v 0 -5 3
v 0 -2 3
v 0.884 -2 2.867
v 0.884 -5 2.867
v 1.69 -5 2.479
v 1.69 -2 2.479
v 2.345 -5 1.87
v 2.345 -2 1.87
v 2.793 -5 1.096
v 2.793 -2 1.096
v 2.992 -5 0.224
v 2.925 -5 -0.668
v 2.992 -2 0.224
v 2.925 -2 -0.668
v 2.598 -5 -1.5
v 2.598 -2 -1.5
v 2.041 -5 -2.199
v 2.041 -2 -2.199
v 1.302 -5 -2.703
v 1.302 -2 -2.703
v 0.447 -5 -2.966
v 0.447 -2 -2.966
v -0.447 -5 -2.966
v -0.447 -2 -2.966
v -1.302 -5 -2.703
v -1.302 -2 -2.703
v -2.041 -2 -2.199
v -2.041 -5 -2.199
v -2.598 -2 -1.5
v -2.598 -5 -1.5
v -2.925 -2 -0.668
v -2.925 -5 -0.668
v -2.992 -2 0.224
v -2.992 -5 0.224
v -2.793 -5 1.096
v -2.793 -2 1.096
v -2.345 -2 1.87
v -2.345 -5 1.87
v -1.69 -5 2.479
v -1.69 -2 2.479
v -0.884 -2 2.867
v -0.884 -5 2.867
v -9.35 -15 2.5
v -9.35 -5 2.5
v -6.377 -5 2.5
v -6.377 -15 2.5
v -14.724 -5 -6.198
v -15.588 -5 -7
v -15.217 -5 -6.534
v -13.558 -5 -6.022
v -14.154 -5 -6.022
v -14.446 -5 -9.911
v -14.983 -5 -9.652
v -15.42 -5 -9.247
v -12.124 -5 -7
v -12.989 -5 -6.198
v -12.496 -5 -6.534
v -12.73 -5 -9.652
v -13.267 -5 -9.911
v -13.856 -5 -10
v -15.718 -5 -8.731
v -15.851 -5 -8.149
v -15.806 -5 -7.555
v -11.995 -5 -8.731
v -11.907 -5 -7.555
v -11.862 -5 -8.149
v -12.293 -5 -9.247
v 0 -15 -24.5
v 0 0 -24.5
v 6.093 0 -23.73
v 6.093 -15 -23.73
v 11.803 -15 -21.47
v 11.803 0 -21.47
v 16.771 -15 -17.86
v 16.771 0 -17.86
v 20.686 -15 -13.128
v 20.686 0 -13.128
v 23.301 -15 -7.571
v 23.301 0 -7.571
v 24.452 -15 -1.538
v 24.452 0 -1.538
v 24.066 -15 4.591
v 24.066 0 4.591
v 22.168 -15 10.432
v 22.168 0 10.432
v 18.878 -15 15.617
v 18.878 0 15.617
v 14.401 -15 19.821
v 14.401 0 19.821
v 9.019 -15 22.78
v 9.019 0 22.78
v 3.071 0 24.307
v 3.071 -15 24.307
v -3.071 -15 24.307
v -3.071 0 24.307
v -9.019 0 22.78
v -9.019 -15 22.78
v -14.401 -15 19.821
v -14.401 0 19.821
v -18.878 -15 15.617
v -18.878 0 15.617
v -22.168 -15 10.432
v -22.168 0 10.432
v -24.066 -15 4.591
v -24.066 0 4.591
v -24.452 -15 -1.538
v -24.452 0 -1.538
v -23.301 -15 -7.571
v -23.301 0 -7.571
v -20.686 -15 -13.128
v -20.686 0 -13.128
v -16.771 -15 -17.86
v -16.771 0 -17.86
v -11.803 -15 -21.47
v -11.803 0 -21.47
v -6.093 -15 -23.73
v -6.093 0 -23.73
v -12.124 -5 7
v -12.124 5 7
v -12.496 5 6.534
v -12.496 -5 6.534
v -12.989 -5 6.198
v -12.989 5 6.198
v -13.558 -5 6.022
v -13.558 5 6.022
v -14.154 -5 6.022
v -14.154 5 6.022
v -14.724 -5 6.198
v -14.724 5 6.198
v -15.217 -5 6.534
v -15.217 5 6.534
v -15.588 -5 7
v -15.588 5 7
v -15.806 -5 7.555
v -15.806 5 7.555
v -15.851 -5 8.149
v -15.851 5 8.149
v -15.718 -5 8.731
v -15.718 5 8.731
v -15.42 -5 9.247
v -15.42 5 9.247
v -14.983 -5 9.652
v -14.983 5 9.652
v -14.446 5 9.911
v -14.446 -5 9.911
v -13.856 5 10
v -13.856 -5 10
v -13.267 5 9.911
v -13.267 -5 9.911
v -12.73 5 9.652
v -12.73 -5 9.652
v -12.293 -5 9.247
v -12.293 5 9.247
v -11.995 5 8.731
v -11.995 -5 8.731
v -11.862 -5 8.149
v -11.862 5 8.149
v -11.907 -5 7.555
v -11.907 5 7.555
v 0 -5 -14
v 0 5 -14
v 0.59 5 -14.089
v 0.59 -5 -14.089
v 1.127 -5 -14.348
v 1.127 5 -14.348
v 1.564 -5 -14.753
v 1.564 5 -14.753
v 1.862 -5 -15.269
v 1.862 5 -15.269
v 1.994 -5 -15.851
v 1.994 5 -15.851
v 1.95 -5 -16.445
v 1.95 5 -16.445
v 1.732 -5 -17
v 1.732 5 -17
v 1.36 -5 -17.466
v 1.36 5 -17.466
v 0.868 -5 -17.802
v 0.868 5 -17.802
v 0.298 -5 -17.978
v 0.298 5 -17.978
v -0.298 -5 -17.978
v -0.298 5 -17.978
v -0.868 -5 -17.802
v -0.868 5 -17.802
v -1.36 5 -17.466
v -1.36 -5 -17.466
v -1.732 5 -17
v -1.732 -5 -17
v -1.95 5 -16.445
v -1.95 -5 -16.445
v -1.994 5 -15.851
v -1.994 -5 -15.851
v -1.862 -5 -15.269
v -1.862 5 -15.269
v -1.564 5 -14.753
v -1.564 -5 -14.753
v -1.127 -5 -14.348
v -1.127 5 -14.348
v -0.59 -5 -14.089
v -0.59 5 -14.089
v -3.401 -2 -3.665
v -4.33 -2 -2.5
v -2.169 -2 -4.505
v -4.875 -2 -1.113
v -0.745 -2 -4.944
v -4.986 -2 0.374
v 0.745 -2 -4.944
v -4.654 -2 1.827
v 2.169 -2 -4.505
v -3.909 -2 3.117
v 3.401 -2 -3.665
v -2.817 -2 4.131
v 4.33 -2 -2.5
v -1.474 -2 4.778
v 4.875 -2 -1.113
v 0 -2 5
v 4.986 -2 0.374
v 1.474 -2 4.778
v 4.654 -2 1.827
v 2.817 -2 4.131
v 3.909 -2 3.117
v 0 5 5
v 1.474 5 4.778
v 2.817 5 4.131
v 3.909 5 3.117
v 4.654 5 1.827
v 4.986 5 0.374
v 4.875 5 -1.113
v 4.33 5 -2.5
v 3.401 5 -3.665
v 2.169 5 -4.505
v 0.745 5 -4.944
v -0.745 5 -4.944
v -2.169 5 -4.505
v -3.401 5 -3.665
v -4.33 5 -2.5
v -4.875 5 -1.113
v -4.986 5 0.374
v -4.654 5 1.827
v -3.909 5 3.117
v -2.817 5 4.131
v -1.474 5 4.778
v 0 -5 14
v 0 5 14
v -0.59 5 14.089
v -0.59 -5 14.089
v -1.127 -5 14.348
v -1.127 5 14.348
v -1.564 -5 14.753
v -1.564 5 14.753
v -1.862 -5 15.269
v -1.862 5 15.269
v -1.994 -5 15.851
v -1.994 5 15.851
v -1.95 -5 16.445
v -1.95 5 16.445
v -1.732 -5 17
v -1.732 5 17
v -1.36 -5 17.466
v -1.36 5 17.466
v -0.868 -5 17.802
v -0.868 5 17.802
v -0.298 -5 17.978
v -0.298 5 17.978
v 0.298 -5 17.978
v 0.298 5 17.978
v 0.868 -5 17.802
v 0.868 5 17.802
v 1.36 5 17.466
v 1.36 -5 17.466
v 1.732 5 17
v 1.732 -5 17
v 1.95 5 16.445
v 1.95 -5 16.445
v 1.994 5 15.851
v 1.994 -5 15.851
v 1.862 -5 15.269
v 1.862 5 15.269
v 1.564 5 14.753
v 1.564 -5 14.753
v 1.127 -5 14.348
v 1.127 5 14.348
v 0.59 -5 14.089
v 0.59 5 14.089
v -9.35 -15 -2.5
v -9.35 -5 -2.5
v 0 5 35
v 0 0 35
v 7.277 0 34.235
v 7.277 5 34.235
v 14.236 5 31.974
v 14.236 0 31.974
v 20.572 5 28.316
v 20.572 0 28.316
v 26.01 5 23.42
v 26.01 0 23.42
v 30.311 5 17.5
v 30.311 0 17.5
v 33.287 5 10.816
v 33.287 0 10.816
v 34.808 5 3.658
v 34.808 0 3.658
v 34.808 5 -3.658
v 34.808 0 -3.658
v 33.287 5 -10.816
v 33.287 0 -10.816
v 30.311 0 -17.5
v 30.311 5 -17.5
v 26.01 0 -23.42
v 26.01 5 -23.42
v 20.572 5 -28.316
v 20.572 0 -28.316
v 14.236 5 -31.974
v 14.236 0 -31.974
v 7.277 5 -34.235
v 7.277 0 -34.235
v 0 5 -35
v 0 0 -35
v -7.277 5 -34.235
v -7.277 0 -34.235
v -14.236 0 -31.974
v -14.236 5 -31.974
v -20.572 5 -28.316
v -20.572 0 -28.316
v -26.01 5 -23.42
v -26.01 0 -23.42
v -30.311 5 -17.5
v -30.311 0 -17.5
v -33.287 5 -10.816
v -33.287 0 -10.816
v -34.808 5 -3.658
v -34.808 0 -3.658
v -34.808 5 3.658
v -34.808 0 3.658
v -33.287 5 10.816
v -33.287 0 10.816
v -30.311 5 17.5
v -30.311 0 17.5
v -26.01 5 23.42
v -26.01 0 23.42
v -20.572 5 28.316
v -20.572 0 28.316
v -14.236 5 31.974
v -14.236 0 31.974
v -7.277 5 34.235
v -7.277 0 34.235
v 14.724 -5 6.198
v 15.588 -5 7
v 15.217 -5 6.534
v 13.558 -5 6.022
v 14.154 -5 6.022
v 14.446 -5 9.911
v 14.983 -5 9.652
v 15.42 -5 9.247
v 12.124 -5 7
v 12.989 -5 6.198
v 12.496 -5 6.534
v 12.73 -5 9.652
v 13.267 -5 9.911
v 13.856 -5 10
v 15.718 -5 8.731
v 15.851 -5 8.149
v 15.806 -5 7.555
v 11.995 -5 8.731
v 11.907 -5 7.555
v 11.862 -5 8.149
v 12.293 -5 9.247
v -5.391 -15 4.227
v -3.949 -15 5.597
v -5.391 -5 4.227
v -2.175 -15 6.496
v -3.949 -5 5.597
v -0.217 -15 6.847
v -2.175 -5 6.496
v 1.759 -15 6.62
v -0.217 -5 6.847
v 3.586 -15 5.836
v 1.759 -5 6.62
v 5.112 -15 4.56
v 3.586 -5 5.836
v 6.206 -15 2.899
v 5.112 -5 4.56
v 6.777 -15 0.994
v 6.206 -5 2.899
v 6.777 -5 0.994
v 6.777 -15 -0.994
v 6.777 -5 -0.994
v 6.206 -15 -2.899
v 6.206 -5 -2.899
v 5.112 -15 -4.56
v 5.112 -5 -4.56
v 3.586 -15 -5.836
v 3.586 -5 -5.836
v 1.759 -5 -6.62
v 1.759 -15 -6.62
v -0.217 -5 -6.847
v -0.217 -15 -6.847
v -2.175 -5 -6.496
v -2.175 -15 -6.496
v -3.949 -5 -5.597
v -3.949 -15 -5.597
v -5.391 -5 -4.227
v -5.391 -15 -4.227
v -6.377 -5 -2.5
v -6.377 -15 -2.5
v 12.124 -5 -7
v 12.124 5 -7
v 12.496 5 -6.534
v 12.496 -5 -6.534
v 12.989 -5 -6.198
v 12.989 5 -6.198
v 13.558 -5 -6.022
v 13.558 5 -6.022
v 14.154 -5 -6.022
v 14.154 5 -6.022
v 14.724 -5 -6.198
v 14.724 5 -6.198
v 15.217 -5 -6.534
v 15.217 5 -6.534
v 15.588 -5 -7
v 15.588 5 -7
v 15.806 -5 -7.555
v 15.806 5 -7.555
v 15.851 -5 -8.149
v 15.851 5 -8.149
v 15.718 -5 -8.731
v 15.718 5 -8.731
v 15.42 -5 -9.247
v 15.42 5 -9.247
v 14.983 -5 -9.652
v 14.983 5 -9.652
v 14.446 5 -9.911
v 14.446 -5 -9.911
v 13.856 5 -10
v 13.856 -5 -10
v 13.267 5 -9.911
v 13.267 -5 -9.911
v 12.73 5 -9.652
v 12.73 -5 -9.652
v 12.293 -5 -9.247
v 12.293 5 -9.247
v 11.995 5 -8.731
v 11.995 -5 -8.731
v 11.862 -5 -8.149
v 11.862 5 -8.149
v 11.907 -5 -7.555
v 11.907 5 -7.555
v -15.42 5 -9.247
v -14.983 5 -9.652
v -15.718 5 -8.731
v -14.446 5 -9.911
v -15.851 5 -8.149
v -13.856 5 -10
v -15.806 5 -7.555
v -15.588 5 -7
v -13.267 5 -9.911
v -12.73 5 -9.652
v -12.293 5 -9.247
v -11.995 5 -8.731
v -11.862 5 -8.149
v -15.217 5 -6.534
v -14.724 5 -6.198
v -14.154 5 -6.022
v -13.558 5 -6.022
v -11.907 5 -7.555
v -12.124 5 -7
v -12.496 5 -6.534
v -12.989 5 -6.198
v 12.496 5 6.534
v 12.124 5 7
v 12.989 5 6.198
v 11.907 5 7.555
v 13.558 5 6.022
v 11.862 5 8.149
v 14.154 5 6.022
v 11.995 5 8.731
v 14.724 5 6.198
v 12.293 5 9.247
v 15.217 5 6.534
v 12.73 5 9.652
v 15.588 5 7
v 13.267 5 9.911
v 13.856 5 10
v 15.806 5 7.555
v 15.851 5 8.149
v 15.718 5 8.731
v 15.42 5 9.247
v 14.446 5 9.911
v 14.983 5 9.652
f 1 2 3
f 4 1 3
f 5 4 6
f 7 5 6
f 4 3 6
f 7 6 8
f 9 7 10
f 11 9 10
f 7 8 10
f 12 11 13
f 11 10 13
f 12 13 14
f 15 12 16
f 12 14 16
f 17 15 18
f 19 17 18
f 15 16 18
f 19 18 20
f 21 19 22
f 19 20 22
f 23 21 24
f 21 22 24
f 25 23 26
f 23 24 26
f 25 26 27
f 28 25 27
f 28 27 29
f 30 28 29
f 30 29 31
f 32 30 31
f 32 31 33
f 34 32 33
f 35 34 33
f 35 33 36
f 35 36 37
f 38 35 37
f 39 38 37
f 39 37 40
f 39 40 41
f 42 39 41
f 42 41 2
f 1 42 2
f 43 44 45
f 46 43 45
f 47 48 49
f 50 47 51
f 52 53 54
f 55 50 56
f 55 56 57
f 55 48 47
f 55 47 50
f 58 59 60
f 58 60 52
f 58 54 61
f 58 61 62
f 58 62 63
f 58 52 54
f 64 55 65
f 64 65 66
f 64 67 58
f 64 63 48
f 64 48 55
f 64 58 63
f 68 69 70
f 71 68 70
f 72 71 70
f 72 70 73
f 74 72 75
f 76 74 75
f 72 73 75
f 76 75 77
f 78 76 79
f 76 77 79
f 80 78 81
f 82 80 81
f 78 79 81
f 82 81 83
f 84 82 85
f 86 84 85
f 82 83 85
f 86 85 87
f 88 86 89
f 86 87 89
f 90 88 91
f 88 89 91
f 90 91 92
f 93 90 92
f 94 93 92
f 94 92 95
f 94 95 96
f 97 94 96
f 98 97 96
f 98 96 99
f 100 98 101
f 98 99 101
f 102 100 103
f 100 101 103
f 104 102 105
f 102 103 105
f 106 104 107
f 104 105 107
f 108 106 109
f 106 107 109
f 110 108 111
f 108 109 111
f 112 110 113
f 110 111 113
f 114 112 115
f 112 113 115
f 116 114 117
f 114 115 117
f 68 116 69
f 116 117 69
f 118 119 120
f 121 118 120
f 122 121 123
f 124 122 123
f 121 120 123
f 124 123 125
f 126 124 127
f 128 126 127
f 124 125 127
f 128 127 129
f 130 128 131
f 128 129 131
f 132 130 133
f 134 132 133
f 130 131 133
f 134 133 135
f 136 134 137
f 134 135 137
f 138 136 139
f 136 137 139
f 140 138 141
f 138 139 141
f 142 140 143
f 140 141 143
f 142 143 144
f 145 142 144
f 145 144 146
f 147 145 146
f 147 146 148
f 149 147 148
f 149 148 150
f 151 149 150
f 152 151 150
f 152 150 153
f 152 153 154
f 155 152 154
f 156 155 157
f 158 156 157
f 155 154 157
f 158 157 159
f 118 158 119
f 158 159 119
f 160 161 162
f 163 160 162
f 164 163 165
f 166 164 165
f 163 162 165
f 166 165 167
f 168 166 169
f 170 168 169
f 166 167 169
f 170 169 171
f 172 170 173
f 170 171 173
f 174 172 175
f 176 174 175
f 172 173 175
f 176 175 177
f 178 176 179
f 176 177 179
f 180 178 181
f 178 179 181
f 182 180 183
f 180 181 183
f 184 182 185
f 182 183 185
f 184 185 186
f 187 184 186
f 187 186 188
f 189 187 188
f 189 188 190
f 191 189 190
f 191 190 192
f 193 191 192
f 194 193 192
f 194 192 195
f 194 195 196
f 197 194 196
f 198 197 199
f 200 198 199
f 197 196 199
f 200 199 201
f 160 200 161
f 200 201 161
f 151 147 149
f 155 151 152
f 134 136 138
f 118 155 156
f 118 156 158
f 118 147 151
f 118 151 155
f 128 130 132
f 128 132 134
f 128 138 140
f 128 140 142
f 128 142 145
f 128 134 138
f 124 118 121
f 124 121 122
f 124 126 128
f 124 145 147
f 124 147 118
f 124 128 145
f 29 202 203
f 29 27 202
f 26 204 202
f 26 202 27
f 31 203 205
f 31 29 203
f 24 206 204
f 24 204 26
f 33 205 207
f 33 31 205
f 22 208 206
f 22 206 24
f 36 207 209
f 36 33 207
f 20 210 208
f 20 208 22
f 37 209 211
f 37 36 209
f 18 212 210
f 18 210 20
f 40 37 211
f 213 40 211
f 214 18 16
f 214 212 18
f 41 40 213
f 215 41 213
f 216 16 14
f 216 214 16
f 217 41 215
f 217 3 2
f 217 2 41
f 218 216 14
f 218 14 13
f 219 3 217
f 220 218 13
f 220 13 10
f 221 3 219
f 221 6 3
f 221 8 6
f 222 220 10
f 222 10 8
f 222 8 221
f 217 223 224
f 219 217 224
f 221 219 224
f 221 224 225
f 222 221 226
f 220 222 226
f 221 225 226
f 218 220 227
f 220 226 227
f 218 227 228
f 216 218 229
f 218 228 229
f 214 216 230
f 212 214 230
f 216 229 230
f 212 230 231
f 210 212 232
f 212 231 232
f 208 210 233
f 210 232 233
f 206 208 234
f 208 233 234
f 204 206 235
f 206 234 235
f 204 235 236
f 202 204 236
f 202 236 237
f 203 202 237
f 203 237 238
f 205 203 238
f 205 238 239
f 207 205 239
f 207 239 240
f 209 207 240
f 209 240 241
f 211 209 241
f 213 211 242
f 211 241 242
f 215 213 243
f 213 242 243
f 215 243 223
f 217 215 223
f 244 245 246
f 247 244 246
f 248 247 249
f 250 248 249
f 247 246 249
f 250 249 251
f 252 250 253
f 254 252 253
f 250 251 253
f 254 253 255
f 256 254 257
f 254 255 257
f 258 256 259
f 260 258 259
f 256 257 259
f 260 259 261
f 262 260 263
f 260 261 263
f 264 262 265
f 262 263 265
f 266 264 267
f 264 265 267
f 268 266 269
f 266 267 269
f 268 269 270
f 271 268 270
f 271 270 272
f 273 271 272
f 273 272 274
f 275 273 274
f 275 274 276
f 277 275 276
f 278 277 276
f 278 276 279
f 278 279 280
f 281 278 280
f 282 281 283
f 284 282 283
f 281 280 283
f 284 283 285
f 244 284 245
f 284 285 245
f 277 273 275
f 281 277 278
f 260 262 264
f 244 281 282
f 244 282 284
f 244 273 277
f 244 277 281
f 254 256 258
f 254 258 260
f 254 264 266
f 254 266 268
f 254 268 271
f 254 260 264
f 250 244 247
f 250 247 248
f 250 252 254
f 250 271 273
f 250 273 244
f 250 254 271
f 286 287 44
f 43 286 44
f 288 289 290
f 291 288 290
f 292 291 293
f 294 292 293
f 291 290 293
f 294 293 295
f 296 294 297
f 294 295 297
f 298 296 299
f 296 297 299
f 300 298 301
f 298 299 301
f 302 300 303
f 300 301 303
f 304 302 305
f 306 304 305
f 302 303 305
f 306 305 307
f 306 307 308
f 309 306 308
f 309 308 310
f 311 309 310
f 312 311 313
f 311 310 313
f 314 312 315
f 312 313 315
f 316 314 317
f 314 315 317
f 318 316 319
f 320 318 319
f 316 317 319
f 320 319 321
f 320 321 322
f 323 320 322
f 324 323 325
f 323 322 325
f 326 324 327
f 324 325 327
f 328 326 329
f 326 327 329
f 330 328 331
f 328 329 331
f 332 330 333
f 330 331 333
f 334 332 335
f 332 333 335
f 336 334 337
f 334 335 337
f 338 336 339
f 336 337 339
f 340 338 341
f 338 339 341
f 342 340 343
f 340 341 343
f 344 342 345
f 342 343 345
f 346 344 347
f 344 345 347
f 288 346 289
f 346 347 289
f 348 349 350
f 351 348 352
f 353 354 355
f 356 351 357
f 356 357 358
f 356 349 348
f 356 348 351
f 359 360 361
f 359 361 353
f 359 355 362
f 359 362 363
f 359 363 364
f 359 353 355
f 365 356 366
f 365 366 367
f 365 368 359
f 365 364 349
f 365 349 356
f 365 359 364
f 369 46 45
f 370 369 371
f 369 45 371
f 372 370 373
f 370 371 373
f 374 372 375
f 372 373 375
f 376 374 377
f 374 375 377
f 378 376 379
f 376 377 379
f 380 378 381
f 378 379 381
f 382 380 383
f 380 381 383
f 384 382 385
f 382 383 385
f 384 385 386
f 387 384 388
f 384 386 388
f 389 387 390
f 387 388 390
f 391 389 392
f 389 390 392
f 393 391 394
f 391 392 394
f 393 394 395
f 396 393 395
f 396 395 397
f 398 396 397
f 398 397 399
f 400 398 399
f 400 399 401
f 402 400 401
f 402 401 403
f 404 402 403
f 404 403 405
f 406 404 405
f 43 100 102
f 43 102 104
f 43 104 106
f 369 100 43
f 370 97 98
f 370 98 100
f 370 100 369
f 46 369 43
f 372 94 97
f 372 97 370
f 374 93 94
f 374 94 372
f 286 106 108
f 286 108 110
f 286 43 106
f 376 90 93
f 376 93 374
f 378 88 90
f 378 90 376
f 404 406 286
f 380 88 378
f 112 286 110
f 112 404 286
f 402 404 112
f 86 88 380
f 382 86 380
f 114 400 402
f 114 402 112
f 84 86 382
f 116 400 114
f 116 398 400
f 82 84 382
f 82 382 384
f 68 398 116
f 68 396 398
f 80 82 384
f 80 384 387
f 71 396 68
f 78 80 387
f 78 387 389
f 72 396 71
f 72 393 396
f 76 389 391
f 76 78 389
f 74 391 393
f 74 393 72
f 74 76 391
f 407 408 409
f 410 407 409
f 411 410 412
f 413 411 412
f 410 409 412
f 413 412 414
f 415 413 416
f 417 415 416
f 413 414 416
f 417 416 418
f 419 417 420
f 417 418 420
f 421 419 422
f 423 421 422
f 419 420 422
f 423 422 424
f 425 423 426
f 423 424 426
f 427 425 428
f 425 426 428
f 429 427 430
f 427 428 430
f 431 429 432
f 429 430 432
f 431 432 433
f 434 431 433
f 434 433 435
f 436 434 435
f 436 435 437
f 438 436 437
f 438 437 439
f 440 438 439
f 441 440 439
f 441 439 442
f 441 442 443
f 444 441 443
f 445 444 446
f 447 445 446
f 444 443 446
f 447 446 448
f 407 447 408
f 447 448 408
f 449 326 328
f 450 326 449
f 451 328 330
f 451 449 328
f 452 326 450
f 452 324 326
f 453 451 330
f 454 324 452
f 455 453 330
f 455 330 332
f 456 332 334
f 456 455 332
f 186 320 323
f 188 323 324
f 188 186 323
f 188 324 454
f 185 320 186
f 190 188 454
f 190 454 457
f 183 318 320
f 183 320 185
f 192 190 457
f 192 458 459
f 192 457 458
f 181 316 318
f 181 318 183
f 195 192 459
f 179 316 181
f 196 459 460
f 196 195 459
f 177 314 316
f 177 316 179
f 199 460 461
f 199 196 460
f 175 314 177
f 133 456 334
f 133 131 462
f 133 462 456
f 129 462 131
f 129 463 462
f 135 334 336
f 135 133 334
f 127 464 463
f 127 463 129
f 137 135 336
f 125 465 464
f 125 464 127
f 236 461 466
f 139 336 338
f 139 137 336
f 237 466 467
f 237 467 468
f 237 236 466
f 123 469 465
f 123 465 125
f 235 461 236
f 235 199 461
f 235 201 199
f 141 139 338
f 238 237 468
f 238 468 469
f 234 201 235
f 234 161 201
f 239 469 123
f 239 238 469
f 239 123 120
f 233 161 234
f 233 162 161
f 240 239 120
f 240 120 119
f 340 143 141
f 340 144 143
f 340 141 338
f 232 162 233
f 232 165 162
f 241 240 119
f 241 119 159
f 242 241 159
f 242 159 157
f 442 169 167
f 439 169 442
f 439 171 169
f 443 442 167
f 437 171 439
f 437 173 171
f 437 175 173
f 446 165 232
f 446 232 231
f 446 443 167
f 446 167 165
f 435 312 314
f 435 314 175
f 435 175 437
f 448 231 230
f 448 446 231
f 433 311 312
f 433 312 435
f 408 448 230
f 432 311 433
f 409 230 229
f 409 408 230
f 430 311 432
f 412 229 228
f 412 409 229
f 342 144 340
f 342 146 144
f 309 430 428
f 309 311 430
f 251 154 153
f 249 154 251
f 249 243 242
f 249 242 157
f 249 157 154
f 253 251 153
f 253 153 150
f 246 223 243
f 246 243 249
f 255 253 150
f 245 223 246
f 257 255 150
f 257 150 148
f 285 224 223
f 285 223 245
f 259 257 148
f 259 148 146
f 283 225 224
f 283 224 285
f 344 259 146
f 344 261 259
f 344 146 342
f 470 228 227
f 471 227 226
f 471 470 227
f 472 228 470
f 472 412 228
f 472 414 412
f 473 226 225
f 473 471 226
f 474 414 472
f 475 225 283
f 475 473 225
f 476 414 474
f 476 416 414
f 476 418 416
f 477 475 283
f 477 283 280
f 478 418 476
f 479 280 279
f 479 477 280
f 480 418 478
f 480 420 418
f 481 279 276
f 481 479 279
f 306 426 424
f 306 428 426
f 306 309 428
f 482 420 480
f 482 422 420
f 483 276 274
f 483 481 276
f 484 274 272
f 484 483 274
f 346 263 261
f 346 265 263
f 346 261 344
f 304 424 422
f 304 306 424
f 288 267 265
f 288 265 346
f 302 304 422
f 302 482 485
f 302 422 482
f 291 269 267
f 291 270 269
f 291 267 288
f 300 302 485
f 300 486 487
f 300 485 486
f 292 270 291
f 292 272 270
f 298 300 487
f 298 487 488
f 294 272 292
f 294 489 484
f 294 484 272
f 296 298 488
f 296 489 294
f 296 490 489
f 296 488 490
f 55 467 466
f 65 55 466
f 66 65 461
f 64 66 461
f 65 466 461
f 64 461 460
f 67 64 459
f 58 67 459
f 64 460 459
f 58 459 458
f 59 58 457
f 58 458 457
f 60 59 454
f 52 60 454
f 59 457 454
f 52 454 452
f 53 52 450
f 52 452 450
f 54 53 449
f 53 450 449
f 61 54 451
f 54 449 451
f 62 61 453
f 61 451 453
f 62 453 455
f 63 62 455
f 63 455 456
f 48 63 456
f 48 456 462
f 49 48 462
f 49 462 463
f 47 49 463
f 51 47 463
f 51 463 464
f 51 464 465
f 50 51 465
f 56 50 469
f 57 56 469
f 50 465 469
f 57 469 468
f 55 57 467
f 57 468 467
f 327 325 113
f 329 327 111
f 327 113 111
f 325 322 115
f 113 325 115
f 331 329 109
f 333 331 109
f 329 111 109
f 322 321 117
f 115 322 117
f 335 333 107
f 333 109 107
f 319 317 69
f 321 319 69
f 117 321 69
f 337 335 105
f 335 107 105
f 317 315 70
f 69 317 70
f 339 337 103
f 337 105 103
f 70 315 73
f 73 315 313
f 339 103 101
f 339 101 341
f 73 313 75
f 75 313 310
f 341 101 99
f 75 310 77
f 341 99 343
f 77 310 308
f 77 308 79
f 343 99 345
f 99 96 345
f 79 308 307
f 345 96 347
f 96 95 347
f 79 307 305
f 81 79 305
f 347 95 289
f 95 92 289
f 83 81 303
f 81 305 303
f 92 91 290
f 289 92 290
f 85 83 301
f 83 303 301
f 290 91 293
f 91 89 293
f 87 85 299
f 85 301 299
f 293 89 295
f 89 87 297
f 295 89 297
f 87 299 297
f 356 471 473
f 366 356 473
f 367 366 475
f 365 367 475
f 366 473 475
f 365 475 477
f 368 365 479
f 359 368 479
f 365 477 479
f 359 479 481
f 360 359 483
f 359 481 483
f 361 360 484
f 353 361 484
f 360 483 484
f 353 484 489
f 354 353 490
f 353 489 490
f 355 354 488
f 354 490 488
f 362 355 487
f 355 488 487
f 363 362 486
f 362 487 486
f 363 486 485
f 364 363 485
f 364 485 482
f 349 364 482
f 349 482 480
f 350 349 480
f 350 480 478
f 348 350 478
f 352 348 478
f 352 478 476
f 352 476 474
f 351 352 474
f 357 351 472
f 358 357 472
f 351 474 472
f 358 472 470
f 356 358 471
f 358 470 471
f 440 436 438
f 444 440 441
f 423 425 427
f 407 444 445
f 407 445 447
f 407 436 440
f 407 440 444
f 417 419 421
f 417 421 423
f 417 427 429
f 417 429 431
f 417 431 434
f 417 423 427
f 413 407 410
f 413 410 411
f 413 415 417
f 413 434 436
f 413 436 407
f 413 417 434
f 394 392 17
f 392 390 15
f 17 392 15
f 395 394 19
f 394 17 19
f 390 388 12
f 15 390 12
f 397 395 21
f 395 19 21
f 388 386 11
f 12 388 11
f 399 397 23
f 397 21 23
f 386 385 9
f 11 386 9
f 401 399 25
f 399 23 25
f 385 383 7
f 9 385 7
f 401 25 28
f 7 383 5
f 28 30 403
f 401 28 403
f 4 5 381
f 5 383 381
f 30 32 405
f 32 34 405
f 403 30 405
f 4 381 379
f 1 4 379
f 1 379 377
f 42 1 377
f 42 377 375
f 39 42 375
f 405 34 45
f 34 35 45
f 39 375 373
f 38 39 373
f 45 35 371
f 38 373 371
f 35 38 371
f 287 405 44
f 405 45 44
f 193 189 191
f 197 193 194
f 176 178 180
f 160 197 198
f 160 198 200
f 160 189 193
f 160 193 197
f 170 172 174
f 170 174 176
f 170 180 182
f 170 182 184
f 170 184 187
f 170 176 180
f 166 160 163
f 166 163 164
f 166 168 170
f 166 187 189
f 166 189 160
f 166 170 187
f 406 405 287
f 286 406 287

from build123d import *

# Parameters (mm, degrees)
CROQUIS1_R              = 35
SALIENTE_EXTRUIR1_DEPTH = 5
CROQUIS2_R              = 24.5
SALIENTE_EXTRUIR2_DEPTH = 15
CROQUIS3_R              = 6.85
SALIENTE_EXTRUIR3_DEPTH = 30
CROQUIS4_R              = 2
CORTAR_EXTRUIR1_DEPTH   = 10
MATRIZC1_COUNT          = 6
CORTAR_EXTRUIR2_START   = -30
CORTAR_EXTRUIR2_DEPTH   = 30
CUT_EXTRUDE1_START      = -40
CUT_EXTRUDE1_DEPTH      = 40
SKETCH2_R               = 5
CUT_EXTRUDE2_DEPTH      = 7
SKETCH3_R               = 3
CUT_EXTRUDE3_DEPTH      = 52.176166328


with BuildPart() as part:
    # Croquis1 → Saliente-Extruir1 (new body)
    with BuildSketch(Plane(origin=(0, 0, 0), x_dir=(1, 0, 0), z_dir=(0, 1, 0))):
        with Locations(Location((0, 0, 0), (0, 0, 270))):
            Circle(CROQUIS1_R)
    extrude(amount=SALIENTE_EXTRUIR1_DEPTH)

    # Croquis2 → Saliente-Extruir2 (add)
    with BuildSketch(Plane.XZ):
        with Locations(Location((0, 0, 0), (0, 0, 270))):
            Circle(CROQUIS2_R)
    extrude(amount=SALIENTE_EXTRUIR2_DEPTH)

    # Croquis3 → Saliente-Extruir3 (add)
    with BuildSketch(Plane.XZ.offset(15)):
        with Locations(Location((0, 0, 0), (0, 0, 270))):
            Circle(CROQUIS3_R)
    extrude(amount=SALIENTE_EXTRUIR3_DEPTH)

    # Croquis4 → Cortar-Extruir1 (cut)
    with BuildSketch(Plane(origin=(0, 5, 0), x_dir=(1, 0, 0), z_dir=(0, 1, 0))):
        with Locations(Location((0, 16, 0), (0, 0, 270))):
            Circle(CROQUIS4_R)
    cortar_extruir1 = extrude(amount=-CORTAR_EXTRUIR1_DEPTH, mode=Mode.SUBTRACT)

    # MatrizC1: Cortar-Extruir1 ×6 about axis
    matrizc1_axis = Axis((0, 0, 0), (0, 1, 0))
    for i in range(1, MATRIZC1_COUNT):
        add(cortar_extruir1.rotate(matrizc1_axis, i * 360 / MATRIZC1_COUNT), mode=Mode.SUBTRACT)

    # Croquis7 → Cortar-Extruir2 (cut)
    with BuildSketch(Plane.XZ.offset(45).offset(CORTAR_EXTRUIR2_START)):
        with BuildLine():
            Line((-6.37749951, 2.5), (-3.47749951, 2.5))
            Line((-3.47749951, 2.5), (-3.47749951, -2.5))
            Line((-3.47749951, -2.5), (-6.37749951, -2.5))
            ThreePointArc((-6.37749951, -2.5), (-6.85, 0), (-6.37749951, 2.5))
        make_face()
    extrude(amount=CORTAR_EXTRUIR2_DEPTH, mode=Mode.SUBTRACT)

    # Sketch1 → Cut-Extrude1 (cut)
    with BuildSketch(Plane.XZ.offset(45).offset(CUT_EXTRUDE1_START)):
        with BuildLine():
            Line((-6.37749951, -2.5), (-9.35, -2.5))
            Line((-9.35, -2.5), (-9.35, 2.5))
            Line((-9.35, 2.5), (-6.37749951, 2.5))
            ThreePointArc((-6.37749951, 2.5), (6.85, 0), (-6.37749951, -2.5))
        make_face()
    extrude(amount=CUT_EXTRUDE1_DEPTH, mode=Mode.SUBTRACT)

    # Sketch2 → Cut-Extrude2 (cut)
    with BuildSketch(Plane(origin=(0, 5, 0), x_dir=(1, 0, 0), z_dir=(0, 1, 0))):
        with Locations(Location((0, 0, 0), (0, 0, 270))):
            Circle(SKETCH2_R)
    extrude(amount=-CUT_EXTRUDE2_DEPTH, mode=Mode.SUBTRACT)

    # Sketch3 → Cut-Extrude3 (cut, through all)
    with BuildSketch(Plane(origin=(0, -2, 0), x_dir=(1, 0, 0), z_dir=(0, 1, 0))):
        with Locations(Location((0, 0, 0), (0, 0, 270))):
            Circle(SKETCH3_R)
    extrude(amount=-CUT_EXTRUDE3_DEPTH, mode=Mode.SUBTRACT)


solid = part.part
